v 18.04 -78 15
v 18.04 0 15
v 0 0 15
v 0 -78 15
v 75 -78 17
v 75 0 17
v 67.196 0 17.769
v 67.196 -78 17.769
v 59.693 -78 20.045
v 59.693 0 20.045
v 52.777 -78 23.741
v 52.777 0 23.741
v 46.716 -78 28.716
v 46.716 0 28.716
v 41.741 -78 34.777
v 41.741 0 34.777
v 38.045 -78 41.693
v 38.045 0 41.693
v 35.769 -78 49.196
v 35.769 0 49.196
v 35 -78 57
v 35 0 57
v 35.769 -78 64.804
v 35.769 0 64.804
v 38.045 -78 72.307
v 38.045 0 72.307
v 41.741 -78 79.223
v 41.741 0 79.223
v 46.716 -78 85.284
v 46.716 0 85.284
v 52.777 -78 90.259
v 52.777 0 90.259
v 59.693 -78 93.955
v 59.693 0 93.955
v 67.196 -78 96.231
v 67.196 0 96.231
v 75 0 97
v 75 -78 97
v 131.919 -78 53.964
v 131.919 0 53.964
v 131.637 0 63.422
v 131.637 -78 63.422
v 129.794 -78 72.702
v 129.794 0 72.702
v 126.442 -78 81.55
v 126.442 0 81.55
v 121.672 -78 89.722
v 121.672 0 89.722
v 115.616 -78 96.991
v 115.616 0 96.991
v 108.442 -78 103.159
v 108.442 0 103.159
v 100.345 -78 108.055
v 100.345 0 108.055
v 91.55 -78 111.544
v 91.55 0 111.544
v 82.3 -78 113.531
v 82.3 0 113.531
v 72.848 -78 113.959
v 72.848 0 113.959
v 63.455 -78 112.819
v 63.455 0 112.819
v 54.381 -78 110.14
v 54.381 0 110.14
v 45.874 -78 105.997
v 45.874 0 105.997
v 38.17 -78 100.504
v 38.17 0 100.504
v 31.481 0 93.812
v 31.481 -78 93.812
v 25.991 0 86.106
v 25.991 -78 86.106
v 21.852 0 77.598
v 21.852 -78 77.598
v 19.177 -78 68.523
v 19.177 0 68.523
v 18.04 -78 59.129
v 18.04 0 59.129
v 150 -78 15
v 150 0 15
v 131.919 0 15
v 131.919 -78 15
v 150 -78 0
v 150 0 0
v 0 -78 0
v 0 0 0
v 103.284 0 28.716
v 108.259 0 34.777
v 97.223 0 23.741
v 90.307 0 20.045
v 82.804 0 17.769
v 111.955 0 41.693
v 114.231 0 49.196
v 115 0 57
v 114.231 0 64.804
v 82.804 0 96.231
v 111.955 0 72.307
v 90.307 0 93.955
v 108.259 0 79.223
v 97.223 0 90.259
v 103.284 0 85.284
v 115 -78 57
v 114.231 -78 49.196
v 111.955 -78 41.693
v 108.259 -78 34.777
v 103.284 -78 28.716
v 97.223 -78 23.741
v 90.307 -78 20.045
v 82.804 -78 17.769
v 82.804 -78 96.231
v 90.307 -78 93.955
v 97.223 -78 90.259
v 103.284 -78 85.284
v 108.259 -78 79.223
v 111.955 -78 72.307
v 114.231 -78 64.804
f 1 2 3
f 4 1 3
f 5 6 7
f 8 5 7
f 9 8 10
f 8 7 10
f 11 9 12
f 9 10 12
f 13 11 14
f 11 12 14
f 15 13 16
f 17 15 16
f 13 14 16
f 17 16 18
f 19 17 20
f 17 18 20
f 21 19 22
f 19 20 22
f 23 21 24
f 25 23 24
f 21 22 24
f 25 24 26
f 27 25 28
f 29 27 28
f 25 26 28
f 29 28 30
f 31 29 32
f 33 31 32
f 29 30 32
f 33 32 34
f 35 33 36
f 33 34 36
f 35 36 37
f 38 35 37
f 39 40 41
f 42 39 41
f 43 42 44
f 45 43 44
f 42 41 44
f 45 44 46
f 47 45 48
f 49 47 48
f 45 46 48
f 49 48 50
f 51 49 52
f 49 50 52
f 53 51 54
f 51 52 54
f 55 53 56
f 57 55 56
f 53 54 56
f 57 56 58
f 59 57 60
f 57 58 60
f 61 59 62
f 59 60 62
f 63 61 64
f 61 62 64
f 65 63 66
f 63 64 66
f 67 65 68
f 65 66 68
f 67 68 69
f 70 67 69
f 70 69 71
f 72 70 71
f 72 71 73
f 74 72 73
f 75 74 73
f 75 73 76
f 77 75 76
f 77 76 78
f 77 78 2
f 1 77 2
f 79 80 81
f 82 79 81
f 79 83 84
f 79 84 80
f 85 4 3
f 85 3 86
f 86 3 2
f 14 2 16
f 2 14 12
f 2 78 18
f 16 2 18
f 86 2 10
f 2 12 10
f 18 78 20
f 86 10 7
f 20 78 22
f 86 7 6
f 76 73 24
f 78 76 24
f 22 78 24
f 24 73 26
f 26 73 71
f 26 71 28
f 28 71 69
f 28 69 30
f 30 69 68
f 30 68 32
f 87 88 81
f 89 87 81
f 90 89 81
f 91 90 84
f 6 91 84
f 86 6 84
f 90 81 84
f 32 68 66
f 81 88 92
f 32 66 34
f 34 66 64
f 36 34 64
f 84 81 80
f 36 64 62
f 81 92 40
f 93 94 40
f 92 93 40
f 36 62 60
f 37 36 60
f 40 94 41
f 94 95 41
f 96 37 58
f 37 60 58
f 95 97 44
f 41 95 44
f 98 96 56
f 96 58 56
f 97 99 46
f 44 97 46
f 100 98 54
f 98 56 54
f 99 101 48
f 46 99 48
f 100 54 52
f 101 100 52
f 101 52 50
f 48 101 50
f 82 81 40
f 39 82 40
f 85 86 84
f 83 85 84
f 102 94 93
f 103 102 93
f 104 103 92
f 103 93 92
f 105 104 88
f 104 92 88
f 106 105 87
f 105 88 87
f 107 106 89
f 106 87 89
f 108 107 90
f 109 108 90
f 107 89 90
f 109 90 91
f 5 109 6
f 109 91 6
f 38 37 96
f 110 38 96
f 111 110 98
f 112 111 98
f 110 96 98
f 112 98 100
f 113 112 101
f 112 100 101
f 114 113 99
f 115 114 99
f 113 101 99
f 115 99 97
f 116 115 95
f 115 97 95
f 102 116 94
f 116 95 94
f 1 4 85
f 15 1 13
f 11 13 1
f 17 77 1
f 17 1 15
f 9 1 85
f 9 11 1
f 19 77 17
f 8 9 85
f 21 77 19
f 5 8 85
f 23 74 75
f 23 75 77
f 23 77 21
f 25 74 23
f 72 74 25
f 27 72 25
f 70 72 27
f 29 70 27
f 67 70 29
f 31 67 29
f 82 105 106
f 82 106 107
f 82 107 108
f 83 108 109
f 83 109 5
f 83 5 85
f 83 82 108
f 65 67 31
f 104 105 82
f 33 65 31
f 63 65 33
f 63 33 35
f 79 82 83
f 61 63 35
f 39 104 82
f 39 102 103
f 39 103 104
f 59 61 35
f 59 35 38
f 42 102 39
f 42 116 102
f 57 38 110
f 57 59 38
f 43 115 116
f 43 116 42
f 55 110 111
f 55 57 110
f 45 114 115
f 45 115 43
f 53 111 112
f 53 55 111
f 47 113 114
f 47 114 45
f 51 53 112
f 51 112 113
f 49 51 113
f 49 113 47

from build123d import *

# Parameters (mm, degrees)
F1_DEPTH = 78


with BuildPart() as f1:
    # F0 (on Front) → F1 (new body)
    with BuildSketch(Plane.XZ):
        with BuildLine():
            Line((0, 15), (0, 0))
            Line((0, 0), (150, 0))
            Line((150, 0), (150, 15))
            Line((150, 15), (131.919114, 15))
            Line((131.919114, 15), (131.919114, 53.964467))
            ThreePointArc((131.919114, 53.964467), (77.582593, 113.941463), (18.039792, 59.129489))
            Line((18.039792, 59.129489), (18.039792, 54.870511))
            Line((18.039792, 54.870511), (18.039792, 15))
            Line((18.039792, 15), (0, 15))
        make_face()
        with BuildLine():
            ThreePointArc((115, 57), (103.284271, 28.715729), (75, 17))
            ThreePointArc((75, 17), (35, 57), (75, 97))
            ThreePointArc((75, 97), (103.284271, 85.284271), (115, 57))
        make_face(mode=Mode.SUBTRACT)
    extrude(amount=F1_DEPTH)


solid = f1.part
